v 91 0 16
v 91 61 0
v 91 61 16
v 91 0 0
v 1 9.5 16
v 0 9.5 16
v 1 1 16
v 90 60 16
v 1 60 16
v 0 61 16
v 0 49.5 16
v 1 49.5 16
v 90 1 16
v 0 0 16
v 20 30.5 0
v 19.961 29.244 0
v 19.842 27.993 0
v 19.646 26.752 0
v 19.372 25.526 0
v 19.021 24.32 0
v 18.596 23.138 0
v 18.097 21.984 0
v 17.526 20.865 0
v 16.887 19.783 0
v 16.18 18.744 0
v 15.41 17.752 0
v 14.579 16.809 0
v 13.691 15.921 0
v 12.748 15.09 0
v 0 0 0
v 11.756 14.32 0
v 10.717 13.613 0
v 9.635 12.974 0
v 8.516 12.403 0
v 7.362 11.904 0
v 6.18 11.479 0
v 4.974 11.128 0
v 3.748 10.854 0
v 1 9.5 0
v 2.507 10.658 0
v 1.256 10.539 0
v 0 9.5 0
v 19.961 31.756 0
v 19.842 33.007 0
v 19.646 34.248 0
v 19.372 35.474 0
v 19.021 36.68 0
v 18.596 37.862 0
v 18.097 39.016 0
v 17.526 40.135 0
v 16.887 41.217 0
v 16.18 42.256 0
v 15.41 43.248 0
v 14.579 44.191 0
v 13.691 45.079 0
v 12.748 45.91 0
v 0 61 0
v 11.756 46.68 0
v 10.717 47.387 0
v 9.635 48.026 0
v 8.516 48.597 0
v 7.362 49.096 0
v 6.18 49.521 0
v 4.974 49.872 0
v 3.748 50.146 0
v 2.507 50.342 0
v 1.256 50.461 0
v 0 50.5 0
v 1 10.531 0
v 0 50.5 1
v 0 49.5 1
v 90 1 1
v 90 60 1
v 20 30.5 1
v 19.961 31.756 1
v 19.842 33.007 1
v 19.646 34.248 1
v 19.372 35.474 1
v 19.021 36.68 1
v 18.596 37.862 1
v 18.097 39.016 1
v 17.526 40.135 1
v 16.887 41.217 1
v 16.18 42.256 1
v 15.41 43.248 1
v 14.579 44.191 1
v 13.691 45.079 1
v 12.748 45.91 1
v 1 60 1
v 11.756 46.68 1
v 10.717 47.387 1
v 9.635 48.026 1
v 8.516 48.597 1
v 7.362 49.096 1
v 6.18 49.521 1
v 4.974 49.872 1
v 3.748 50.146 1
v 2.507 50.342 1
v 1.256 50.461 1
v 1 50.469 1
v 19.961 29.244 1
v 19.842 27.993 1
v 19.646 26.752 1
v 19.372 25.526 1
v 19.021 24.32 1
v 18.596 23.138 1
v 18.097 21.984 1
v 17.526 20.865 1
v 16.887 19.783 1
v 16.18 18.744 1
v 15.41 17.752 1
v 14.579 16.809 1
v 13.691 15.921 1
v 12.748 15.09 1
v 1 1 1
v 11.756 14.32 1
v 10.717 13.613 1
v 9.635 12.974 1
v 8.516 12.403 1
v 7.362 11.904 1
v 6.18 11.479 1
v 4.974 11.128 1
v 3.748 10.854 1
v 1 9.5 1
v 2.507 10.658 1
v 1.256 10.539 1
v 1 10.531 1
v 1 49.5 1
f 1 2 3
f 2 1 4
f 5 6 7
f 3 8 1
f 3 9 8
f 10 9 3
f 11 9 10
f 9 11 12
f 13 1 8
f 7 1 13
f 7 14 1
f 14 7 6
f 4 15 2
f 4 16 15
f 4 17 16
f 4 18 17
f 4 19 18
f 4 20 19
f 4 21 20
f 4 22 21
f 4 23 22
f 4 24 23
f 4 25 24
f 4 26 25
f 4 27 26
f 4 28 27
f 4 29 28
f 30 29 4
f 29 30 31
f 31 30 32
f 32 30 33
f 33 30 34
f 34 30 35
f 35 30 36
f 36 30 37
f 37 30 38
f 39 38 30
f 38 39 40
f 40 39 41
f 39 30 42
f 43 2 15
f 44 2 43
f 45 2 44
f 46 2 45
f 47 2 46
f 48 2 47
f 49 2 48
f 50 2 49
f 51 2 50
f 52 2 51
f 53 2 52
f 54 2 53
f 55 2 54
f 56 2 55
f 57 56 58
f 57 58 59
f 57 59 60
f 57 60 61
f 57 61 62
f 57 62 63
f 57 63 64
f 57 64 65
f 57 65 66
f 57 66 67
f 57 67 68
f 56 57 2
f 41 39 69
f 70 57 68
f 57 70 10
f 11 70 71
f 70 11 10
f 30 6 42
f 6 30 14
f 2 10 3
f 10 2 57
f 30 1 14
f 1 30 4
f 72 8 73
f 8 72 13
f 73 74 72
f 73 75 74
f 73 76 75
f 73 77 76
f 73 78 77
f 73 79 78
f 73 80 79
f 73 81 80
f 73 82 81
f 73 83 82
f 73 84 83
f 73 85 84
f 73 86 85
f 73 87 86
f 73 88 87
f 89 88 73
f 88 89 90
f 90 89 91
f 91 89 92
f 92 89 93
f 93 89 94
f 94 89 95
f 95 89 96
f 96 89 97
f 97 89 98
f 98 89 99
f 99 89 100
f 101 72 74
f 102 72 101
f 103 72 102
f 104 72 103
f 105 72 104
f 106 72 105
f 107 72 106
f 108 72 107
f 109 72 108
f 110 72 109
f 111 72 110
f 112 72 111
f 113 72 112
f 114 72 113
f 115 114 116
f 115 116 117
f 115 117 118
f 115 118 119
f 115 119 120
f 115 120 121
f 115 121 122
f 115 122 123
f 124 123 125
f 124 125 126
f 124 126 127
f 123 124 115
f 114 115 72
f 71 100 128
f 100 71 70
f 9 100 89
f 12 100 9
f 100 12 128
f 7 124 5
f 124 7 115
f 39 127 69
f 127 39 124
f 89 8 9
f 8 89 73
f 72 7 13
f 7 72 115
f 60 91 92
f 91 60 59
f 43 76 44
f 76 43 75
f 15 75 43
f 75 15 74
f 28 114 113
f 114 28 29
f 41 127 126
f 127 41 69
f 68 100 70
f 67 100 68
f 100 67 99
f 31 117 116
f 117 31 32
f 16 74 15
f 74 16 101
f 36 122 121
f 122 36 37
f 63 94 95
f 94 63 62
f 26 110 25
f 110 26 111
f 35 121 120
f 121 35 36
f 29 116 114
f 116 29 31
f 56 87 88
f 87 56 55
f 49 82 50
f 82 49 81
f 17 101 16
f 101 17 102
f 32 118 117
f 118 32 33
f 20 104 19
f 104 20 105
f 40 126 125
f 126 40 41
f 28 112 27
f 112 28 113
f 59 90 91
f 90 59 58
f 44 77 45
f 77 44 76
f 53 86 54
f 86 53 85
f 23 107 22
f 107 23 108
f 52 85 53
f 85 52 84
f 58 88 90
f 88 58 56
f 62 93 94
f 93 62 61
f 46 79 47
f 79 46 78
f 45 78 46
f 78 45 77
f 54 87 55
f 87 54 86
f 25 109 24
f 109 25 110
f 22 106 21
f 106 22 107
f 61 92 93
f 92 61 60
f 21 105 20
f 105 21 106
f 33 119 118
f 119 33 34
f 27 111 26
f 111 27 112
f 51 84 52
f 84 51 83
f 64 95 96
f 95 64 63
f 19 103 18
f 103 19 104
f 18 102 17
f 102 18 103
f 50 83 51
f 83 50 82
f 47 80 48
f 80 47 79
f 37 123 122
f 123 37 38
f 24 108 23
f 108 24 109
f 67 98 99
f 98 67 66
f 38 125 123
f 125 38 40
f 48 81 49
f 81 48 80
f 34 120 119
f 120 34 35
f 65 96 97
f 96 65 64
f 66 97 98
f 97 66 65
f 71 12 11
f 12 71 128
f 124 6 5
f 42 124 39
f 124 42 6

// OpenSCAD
// Karten: 87mm x 57mm -> 89x59
// Automa: 10mm hoch -> 13mm
// Bonuskarten: 13mm -> 15mm
// Vogelkarten: 30mm hoch -> 32mm
// Rahmen: 1mm

// Wertungsblock: 112x81mm

hoehe = 15;
$fn = 100;

difference(){
    cube([91,61,hoehe+1]);
    translate([1,1,1]){
        cube([89,59,hoehe]);
    }
    translate([0,61/2,0]){
        linear_extrude(1){
            circle(20);
        }
    }
    #translate([0,19/2,0]){
        cube([1,40,hoehe+1]);
    }
}
